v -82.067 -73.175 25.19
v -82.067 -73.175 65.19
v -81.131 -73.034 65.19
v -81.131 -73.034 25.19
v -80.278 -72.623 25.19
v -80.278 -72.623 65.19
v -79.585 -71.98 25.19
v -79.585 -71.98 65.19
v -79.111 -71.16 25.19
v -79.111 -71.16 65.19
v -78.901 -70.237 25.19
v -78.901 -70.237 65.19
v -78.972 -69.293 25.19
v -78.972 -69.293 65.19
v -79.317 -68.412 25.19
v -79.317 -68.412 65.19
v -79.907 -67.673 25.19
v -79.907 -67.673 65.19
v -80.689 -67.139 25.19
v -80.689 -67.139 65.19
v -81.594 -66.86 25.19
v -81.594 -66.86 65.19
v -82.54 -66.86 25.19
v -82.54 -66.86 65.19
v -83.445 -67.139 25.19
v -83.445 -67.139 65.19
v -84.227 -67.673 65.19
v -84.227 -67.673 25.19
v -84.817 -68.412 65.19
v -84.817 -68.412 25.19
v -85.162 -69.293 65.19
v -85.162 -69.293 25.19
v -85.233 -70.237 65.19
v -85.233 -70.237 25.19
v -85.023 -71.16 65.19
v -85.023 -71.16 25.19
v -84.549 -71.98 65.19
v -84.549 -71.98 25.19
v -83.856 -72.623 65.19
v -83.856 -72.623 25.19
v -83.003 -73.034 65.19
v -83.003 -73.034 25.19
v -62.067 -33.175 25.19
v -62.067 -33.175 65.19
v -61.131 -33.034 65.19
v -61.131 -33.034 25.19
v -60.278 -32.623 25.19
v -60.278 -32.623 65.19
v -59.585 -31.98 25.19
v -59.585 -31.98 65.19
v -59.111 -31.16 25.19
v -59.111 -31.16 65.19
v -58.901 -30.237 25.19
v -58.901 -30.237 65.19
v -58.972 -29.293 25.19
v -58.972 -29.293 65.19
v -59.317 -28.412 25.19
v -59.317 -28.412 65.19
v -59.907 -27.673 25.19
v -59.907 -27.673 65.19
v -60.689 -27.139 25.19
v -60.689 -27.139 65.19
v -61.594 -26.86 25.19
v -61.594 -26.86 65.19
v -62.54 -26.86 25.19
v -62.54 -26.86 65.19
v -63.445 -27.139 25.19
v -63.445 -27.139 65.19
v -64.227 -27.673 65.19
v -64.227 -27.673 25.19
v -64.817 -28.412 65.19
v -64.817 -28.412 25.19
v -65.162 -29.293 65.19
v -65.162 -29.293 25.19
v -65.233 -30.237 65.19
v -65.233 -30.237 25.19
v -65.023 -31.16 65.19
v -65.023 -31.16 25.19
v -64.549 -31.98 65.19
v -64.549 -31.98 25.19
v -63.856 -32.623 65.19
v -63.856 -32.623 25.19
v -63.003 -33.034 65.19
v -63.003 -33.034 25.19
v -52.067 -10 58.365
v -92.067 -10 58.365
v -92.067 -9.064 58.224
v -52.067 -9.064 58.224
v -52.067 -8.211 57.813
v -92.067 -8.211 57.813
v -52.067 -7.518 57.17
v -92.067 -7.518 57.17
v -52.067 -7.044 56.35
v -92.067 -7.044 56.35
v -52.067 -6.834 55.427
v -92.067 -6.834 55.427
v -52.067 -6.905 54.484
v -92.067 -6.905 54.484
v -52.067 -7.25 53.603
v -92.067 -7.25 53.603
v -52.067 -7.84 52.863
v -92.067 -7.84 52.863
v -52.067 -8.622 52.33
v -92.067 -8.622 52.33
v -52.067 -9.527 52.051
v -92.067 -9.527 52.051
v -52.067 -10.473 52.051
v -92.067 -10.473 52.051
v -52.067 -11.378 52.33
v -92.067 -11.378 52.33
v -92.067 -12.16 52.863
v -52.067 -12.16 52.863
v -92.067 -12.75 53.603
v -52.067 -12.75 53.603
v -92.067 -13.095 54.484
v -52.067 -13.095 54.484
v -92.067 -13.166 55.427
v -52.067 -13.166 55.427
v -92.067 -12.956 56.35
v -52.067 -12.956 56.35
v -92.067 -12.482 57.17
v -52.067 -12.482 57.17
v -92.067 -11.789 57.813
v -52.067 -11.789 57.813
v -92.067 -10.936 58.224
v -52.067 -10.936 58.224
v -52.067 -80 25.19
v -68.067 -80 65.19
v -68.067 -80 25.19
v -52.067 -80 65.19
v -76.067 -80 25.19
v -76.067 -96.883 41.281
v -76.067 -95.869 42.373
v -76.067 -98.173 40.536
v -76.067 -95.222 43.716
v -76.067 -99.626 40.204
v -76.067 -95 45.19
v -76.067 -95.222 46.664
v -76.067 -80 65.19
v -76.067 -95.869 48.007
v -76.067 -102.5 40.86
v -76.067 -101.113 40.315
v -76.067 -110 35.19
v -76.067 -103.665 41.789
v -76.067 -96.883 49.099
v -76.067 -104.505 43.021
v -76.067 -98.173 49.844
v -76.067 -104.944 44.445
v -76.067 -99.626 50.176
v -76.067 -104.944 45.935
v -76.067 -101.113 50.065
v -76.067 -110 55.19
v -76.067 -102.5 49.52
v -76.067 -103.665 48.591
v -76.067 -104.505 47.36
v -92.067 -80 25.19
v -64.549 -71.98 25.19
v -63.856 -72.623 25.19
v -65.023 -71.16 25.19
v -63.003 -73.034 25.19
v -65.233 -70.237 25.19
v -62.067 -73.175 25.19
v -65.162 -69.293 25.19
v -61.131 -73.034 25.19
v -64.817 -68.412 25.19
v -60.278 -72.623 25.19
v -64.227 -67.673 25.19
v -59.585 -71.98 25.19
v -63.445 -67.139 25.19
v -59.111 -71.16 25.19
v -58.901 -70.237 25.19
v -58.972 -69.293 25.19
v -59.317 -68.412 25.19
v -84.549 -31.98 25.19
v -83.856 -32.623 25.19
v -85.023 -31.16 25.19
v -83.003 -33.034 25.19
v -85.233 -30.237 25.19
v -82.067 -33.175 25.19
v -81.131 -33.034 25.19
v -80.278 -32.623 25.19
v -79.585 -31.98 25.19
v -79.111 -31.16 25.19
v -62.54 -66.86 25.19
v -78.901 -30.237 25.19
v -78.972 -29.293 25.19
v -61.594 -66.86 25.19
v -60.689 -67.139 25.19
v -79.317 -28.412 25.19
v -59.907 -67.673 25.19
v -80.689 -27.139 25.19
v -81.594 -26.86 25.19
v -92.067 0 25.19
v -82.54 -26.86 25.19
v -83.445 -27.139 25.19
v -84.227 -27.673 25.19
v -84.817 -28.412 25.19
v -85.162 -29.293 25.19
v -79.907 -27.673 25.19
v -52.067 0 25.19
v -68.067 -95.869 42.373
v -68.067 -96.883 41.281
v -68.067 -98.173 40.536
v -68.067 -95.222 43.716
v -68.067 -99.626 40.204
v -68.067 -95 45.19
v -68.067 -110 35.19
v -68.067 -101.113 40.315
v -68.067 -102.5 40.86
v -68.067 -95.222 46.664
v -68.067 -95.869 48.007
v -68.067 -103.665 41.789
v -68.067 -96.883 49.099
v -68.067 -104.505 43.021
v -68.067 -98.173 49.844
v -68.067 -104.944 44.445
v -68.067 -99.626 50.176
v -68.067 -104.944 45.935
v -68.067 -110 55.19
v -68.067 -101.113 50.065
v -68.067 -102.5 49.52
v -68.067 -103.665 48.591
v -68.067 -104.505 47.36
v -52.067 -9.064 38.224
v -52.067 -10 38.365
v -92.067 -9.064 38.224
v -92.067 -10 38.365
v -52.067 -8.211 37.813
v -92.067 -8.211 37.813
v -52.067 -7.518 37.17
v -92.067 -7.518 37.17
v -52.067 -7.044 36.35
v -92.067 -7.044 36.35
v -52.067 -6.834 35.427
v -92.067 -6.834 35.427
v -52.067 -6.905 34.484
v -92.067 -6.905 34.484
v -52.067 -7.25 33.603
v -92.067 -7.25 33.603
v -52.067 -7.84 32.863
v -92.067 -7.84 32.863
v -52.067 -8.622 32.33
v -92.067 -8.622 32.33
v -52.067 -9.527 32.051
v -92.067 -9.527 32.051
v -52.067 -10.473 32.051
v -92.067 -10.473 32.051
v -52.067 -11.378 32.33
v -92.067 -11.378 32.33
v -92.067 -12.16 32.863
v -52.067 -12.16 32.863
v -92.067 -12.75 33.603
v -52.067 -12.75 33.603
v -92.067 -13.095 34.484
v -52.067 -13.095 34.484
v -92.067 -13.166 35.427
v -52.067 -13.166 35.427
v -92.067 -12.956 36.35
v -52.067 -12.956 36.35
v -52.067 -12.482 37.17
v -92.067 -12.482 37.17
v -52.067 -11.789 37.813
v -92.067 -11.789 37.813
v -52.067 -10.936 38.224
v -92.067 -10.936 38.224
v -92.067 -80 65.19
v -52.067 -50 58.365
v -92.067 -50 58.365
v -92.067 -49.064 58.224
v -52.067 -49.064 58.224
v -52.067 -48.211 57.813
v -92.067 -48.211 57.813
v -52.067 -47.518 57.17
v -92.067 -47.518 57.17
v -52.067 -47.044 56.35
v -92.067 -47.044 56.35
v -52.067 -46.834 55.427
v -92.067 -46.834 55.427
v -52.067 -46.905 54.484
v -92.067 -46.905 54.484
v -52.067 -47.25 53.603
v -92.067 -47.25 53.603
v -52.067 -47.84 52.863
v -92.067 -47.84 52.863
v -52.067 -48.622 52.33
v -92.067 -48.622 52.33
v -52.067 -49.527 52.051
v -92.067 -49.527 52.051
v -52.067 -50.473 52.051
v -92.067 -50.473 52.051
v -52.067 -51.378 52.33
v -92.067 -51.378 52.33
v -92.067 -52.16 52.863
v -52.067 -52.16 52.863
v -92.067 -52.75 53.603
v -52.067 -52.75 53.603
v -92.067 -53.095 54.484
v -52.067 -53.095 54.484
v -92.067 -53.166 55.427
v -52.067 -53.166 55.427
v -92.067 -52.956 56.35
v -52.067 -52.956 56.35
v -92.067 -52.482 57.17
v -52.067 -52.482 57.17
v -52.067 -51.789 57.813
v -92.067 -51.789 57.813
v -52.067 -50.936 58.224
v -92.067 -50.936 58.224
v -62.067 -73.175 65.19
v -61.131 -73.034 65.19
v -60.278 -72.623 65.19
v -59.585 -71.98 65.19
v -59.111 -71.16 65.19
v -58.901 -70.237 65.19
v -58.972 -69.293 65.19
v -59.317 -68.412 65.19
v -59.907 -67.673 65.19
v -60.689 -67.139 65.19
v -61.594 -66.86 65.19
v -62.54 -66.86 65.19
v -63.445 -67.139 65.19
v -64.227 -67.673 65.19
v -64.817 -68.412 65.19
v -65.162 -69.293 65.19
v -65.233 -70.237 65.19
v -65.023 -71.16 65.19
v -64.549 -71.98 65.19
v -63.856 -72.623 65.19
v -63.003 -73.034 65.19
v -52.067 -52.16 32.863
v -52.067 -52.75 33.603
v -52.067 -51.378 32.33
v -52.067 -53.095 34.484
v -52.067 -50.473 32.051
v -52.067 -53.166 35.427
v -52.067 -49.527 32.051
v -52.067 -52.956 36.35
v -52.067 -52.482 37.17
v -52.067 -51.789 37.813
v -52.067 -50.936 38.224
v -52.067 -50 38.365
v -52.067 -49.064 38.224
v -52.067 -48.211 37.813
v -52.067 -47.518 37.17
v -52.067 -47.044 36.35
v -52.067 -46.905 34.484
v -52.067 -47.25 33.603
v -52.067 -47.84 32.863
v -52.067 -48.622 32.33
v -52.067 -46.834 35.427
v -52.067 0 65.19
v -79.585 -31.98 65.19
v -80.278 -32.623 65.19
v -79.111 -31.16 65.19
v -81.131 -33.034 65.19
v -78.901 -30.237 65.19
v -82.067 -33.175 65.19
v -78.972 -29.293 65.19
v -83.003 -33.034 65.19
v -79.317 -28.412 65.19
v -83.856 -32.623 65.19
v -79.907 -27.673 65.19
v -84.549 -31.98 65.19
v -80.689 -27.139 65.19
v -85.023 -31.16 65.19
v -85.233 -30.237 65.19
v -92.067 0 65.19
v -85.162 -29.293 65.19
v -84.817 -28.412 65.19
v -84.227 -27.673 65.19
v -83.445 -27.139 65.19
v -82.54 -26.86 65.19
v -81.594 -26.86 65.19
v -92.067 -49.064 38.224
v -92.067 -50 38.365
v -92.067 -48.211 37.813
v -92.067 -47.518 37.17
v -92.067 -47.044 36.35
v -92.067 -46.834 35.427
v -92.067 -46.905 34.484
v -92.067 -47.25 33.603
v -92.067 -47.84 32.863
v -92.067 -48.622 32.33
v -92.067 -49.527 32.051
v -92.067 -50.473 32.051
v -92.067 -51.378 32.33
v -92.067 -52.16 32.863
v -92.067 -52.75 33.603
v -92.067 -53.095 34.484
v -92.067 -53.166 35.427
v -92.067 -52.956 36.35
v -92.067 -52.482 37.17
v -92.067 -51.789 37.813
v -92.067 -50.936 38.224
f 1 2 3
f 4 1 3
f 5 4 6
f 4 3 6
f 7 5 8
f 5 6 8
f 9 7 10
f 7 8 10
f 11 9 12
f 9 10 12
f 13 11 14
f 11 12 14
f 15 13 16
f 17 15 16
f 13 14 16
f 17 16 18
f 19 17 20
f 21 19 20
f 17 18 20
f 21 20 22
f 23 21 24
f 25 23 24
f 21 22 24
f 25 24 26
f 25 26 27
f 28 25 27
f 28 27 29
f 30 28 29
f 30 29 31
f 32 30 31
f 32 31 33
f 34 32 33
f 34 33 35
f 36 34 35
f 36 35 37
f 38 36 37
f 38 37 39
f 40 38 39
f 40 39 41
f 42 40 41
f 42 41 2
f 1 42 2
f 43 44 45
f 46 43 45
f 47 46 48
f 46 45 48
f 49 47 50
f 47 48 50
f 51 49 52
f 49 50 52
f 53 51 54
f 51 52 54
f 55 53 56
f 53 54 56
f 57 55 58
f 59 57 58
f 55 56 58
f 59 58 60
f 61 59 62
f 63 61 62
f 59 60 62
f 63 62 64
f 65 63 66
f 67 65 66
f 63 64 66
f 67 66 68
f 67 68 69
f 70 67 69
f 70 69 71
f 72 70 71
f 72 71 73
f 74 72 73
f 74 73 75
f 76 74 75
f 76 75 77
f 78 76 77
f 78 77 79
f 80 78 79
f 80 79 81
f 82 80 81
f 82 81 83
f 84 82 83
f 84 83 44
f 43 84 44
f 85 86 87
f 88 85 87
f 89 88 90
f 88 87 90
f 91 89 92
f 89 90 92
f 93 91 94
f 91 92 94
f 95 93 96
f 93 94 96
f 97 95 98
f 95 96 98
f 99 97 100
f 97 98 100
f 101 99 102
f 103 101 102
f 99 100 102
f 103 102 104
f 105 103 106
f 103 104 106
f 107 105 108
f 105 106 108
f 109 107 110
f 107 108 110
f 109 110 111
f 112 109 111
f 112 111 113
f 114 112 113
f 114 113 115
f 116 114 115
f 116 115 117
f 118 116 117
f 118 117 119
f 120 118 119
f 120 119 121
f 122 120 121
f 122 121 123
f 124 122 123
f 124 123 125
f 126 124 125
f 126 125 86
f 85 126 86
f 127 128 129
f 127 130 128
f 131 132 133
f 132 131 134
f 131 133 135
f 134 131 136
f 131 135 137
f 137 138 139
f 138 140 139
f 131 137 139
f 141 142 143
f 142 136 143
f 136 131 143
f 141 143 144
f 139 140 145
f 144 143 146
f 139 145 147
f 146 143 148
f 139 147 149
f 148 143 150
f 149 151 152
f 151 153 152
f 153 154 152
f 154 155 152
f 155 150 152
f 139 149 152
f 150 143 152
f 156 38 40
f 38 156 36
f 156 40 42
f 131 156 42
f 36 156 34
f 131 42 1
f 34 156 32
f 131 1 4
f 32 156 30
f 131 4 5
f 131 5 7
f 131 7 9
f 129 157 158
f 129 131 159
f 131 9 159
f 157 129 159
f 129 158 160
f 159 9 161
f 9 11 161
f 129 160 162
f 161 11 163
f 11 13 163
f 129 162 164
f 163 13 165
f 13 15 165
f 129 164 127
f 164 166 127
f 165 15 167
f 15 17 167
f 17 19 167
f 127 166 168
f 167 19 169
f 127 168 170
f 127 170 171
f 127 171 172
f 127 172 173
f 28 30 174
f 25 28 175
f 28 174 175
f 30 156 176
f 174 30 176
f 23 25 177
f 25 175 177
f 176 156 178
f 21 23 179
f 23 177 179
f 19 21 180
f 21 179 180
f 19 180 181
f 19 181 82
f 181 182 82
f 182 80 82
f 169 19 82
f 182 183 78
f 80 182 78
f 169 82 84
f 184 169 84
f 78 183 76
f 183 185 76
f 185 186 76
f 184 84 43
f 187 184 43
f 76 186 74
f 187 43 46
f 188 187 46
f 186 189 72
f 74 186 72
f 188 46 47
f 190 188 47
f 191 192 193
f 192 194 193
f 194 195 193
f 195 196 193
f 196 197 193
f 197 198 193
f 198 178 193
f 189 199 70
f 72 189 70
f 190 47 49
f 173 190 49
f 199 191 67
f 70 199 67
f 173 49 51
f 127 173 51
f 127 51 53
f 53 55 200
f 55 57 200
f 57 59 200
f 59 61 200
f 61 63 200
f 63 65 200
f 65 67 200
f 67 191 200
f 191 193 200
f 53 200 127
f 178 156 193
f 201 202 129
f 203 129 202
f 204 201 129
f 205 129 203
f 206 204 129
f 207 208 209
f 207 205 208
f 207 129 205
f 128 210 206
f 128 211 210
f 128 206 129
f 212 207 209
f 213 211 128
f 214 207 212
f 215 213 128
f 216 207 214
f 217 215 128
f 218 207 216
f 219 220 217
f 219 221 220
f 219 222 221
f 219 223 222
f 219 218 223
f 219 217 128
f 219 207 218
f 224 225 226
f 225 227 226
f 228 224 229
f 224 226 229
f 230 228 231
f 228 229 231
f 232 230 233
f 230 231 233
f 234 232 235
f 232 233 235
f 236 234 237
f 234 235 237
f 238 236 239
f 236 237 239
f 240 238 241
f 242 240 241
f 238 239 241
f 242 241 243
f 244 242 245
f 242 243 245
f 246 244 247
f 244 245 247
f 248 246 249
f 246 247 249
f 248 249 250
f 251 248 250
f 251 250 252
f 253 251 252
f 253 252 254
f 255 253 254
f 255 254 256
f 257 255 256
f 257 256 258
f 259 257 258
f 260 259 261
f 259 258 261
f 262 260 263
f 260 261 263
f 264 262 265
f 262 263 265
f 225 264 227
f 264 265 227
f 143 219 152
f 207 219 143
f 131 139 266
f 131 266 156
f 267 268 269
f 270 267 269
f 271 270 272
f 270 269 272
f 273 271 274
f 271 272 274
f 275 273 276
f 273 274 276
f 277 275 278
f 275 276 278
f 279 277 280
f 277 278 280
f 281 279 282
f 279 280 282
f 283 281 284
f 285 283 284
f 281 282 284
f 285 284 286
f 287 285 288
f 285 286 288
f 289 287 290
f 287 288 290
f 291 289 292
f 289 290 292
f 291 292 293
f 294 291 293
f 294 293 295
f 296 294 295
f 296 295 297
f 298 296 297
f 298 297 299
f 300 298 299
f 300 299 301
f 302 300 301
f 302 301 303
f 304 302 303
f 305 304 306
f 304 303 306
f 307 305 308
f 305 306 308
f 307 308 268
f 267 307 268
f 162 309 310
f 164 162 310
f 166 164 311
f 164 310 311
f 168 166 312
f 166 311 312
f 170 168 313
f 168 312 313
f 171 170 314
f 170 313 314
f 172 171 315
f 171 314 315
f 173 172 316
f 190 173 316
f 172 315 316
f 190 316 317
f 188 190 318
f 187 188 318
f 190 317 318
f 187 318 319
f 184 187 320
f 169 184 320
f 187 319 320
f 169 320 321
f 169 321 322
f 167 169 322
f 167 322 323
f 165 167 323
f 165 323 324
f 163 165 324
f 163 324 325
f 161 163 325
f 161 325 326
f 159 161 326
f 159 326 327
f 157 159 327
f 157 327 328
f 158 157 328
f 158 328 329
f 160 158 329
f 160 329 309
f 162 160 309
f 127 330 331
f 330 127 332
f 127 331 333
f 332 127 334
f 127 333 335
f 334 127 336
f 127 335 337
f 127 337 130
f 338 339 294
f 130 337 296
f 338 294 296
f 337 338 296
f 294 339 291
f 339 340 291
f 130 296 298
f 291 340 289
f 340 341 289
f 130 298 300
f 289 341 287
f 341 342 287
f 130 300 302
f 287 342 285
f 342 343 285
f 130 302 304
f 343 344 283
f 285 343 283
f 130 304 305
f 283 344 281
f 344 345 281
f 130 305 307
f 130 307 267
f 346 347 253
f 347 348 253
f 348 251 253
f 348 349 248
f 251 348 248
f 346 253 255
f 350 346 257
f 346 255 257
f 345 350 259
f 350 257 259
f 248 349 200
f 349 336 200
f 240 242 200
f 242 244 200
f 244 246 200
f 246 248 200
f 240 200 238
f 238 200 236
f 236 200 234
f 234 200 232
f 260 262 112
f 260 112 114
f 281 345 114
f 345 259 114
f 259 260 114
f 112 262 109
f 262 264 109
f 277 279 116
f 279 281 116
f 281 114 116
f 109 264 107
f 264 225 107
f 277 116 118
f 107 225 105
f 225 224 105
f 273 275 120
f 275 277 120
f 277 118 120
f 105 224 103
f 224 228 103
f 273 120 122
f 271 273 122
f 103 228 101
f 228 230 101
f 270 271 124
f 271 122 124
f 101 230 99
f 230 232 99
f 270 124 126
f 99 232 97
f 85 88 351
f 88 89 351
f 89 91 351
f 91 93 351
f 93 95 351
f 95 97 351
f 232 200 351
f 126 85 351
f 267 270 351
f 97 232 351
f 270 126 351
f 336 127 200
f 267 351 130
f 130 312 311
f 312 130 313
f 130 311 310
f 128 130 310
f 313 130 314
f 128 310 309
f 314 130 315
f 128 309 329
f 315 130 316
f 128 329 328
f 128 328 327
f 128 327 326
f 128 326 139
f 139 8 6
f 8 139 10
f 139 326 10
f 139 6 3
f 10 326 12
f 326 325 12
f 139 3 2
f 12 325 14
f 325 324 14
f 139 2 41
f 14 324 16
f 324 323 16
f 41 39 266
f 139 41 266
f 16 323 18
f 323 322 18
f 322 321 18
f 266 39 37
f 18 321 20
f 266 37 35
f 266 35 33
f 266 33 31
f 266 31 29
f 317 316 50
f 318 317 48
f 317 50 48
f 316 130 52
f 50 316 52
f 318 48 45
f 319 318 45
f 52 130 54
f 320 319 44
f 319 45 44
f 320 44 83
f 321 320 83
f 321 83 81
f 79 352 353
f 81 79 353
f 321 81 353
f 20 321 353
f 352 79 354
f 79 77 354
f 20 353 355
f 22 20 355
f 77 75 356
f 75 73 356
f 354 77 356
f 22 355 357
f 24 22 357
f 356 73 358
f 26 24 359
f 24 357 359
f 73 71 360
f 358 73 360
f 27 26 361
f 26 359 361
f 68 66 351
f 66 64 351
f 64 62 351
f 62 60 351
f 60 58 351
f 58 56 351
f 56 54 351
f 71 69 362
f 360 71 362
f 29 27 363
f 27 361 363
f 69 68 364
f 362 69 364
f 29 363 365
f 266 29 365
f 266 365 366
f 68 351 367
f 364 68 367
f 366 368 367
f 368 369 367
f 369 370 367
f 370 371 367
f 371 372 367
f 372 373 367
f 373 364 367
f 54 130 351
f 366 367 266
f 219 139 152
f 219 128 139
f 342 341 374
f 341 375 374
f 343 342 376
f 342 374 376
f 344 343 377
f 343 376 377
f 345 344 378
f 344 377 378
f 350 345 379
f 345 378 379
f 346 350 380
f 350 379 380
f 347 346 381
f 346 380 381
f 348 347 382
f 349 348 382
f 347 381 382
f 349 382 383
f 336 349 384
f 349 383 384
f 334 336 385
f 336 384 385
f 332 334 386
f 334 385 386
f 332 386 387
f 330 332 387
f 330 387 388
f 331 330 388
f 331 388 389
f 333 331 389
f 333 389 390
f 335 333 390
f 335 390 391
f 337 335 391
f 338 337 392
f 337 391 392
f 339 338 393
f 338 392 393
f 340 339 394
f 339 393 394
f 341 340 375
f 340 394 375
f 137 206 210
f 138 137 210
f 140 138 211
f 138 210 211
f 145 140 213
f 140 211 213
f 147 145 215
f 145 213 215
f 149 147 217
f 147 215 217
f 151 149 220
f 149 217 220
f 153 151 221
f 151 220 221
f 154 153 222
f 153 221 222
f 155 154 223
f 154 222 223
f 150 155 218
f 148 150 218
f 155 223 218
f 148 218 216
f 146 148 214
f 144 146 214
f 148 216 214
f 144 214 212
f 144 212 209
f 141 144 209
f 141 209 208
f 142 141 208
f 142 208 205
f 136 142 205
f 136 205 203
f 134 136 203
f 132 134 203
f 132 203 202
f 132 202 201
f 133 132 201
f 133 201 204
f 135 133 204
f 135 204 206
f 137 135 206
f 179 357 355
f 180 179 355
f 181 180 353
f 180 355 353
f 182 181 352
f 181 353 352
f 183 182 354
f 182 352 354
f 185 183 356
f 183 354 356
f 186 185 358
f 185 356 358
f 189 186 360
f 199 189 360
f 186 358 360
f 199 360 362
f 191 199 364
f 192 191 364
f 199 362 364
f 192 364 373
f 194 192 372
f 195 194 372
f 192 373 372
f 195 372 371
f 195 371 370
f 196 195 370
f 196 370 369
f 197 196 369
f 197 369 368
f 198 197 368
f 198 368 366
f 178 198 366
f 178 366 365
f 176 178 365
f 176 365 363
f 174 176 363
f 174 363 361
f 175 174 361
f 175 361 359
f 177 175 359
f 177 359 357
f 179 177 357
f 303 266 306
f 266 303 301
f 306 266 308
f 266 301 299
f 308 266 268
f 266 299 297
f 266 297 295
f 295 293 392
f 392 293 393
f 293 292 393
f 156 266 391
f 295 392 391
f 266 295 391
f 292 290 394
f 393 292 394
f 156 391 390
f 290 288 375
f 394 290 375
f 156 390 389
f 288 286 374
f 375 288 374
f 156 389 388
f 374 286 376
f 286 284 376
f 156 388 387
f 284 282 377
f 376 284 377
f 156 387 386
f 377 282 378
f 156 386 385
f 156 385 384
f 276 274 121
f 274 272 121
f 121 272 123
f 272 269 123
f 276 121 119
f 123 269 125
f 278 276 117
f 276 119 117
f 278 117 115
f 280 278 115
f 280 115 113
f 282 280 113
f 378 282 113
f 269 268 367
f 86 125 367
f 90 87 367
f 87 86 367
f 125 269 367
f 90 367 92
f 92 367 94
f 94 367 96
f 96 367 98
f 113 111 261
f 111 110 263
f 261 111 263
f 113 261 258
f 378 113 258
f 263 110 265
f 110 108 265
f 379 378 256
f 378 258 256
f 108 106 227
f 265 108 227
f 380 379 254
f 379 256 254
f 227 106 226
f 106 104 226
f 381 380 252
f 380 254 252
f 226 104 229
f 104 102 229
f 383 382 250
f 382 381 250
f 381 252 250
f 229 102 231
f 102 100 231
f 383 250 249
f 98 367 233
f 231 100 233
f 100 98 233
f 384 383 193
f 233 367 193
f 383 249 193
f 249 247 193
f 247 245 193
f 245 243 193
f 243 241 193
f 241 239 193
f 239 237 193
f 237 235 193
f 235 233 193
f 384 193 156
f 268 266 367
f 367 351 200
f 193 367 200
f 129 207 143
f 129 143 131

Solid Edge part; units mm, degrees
sketch "Sketch1" plane through (0, 0, 0) normal (0, -1, 0) x (1, 0, 0)
  line L0 (-92.067, 25.1901) -> (-52.067, 25.1901)
  line L1 (-52.067, 25.1901) -> (-52.067, 65.1901)
  line L2 (-52.067, 65.1901) -> (-92.067, 65.1901)
  line L3 (-92.067, 65.1901) -> (-92.067, 25.1901)
  dimension "D1" = 40
  dimension "D2" = 40
extrude "Protrusion1" add sketch "Sketch1" along normal blind 80
sketch "Sketch2" plane through (-68.067, -75, 45.1901) normal (1, 0, 0) x (0, 1, 0)
  circle A0 centre (-25, 0) radius 5
  line L0 (-5, 20) -> (-35, 10)
  line L1 (-35, 10) -> (-35, -10)
  line L2 (-35, -10) -> (-5, -20)
  line L3 (-5, -20) -> (-5, 20)
  dimension "D1" = 10
  dimension "D2" = 20
  dimension "D3" = 10
  dimension "D4" = 30
extrude "ExtrudedProtrusion_2" add sketch "Sketch2" against normal blind 8
hole "Hole_1" at (-92.067, -50, 55.1901) direction (1, 0, 0) diameter 6.35 end up to next
hole "Hole1" at (-92.067, -10, 35.1901) direction (1, 0, 0) diameter 6.35 end up to next
hole "Hole2" at (-92.067, -50, 35.1901) direction (1, 0, 0) diameter 6.35 end up to next
hole "Hole3" at (-92.067, -10, 55.1901) direction (1, 0, 0) diameter 6.35 end up to next
hole "Hole_5" at (-62.067, -30, 65.1901) direction (0, 0, -1) diameter 6.35 end up to next
hole "Hole4" at (-82.067, -30, 65.1901) direction (0, 0, -1) diameter 6.35 end up to next
hole "Hole5" at (-82.067, -70, 65.1901) direction (0, 0, -1) diameter 6.35 end up to next
hole "Hole6" at (-62.067, -70, 65.1901) direction (0, 0, -1) diameter 6.35 end up to next
properties material "Aluminum, 6061-T6"
